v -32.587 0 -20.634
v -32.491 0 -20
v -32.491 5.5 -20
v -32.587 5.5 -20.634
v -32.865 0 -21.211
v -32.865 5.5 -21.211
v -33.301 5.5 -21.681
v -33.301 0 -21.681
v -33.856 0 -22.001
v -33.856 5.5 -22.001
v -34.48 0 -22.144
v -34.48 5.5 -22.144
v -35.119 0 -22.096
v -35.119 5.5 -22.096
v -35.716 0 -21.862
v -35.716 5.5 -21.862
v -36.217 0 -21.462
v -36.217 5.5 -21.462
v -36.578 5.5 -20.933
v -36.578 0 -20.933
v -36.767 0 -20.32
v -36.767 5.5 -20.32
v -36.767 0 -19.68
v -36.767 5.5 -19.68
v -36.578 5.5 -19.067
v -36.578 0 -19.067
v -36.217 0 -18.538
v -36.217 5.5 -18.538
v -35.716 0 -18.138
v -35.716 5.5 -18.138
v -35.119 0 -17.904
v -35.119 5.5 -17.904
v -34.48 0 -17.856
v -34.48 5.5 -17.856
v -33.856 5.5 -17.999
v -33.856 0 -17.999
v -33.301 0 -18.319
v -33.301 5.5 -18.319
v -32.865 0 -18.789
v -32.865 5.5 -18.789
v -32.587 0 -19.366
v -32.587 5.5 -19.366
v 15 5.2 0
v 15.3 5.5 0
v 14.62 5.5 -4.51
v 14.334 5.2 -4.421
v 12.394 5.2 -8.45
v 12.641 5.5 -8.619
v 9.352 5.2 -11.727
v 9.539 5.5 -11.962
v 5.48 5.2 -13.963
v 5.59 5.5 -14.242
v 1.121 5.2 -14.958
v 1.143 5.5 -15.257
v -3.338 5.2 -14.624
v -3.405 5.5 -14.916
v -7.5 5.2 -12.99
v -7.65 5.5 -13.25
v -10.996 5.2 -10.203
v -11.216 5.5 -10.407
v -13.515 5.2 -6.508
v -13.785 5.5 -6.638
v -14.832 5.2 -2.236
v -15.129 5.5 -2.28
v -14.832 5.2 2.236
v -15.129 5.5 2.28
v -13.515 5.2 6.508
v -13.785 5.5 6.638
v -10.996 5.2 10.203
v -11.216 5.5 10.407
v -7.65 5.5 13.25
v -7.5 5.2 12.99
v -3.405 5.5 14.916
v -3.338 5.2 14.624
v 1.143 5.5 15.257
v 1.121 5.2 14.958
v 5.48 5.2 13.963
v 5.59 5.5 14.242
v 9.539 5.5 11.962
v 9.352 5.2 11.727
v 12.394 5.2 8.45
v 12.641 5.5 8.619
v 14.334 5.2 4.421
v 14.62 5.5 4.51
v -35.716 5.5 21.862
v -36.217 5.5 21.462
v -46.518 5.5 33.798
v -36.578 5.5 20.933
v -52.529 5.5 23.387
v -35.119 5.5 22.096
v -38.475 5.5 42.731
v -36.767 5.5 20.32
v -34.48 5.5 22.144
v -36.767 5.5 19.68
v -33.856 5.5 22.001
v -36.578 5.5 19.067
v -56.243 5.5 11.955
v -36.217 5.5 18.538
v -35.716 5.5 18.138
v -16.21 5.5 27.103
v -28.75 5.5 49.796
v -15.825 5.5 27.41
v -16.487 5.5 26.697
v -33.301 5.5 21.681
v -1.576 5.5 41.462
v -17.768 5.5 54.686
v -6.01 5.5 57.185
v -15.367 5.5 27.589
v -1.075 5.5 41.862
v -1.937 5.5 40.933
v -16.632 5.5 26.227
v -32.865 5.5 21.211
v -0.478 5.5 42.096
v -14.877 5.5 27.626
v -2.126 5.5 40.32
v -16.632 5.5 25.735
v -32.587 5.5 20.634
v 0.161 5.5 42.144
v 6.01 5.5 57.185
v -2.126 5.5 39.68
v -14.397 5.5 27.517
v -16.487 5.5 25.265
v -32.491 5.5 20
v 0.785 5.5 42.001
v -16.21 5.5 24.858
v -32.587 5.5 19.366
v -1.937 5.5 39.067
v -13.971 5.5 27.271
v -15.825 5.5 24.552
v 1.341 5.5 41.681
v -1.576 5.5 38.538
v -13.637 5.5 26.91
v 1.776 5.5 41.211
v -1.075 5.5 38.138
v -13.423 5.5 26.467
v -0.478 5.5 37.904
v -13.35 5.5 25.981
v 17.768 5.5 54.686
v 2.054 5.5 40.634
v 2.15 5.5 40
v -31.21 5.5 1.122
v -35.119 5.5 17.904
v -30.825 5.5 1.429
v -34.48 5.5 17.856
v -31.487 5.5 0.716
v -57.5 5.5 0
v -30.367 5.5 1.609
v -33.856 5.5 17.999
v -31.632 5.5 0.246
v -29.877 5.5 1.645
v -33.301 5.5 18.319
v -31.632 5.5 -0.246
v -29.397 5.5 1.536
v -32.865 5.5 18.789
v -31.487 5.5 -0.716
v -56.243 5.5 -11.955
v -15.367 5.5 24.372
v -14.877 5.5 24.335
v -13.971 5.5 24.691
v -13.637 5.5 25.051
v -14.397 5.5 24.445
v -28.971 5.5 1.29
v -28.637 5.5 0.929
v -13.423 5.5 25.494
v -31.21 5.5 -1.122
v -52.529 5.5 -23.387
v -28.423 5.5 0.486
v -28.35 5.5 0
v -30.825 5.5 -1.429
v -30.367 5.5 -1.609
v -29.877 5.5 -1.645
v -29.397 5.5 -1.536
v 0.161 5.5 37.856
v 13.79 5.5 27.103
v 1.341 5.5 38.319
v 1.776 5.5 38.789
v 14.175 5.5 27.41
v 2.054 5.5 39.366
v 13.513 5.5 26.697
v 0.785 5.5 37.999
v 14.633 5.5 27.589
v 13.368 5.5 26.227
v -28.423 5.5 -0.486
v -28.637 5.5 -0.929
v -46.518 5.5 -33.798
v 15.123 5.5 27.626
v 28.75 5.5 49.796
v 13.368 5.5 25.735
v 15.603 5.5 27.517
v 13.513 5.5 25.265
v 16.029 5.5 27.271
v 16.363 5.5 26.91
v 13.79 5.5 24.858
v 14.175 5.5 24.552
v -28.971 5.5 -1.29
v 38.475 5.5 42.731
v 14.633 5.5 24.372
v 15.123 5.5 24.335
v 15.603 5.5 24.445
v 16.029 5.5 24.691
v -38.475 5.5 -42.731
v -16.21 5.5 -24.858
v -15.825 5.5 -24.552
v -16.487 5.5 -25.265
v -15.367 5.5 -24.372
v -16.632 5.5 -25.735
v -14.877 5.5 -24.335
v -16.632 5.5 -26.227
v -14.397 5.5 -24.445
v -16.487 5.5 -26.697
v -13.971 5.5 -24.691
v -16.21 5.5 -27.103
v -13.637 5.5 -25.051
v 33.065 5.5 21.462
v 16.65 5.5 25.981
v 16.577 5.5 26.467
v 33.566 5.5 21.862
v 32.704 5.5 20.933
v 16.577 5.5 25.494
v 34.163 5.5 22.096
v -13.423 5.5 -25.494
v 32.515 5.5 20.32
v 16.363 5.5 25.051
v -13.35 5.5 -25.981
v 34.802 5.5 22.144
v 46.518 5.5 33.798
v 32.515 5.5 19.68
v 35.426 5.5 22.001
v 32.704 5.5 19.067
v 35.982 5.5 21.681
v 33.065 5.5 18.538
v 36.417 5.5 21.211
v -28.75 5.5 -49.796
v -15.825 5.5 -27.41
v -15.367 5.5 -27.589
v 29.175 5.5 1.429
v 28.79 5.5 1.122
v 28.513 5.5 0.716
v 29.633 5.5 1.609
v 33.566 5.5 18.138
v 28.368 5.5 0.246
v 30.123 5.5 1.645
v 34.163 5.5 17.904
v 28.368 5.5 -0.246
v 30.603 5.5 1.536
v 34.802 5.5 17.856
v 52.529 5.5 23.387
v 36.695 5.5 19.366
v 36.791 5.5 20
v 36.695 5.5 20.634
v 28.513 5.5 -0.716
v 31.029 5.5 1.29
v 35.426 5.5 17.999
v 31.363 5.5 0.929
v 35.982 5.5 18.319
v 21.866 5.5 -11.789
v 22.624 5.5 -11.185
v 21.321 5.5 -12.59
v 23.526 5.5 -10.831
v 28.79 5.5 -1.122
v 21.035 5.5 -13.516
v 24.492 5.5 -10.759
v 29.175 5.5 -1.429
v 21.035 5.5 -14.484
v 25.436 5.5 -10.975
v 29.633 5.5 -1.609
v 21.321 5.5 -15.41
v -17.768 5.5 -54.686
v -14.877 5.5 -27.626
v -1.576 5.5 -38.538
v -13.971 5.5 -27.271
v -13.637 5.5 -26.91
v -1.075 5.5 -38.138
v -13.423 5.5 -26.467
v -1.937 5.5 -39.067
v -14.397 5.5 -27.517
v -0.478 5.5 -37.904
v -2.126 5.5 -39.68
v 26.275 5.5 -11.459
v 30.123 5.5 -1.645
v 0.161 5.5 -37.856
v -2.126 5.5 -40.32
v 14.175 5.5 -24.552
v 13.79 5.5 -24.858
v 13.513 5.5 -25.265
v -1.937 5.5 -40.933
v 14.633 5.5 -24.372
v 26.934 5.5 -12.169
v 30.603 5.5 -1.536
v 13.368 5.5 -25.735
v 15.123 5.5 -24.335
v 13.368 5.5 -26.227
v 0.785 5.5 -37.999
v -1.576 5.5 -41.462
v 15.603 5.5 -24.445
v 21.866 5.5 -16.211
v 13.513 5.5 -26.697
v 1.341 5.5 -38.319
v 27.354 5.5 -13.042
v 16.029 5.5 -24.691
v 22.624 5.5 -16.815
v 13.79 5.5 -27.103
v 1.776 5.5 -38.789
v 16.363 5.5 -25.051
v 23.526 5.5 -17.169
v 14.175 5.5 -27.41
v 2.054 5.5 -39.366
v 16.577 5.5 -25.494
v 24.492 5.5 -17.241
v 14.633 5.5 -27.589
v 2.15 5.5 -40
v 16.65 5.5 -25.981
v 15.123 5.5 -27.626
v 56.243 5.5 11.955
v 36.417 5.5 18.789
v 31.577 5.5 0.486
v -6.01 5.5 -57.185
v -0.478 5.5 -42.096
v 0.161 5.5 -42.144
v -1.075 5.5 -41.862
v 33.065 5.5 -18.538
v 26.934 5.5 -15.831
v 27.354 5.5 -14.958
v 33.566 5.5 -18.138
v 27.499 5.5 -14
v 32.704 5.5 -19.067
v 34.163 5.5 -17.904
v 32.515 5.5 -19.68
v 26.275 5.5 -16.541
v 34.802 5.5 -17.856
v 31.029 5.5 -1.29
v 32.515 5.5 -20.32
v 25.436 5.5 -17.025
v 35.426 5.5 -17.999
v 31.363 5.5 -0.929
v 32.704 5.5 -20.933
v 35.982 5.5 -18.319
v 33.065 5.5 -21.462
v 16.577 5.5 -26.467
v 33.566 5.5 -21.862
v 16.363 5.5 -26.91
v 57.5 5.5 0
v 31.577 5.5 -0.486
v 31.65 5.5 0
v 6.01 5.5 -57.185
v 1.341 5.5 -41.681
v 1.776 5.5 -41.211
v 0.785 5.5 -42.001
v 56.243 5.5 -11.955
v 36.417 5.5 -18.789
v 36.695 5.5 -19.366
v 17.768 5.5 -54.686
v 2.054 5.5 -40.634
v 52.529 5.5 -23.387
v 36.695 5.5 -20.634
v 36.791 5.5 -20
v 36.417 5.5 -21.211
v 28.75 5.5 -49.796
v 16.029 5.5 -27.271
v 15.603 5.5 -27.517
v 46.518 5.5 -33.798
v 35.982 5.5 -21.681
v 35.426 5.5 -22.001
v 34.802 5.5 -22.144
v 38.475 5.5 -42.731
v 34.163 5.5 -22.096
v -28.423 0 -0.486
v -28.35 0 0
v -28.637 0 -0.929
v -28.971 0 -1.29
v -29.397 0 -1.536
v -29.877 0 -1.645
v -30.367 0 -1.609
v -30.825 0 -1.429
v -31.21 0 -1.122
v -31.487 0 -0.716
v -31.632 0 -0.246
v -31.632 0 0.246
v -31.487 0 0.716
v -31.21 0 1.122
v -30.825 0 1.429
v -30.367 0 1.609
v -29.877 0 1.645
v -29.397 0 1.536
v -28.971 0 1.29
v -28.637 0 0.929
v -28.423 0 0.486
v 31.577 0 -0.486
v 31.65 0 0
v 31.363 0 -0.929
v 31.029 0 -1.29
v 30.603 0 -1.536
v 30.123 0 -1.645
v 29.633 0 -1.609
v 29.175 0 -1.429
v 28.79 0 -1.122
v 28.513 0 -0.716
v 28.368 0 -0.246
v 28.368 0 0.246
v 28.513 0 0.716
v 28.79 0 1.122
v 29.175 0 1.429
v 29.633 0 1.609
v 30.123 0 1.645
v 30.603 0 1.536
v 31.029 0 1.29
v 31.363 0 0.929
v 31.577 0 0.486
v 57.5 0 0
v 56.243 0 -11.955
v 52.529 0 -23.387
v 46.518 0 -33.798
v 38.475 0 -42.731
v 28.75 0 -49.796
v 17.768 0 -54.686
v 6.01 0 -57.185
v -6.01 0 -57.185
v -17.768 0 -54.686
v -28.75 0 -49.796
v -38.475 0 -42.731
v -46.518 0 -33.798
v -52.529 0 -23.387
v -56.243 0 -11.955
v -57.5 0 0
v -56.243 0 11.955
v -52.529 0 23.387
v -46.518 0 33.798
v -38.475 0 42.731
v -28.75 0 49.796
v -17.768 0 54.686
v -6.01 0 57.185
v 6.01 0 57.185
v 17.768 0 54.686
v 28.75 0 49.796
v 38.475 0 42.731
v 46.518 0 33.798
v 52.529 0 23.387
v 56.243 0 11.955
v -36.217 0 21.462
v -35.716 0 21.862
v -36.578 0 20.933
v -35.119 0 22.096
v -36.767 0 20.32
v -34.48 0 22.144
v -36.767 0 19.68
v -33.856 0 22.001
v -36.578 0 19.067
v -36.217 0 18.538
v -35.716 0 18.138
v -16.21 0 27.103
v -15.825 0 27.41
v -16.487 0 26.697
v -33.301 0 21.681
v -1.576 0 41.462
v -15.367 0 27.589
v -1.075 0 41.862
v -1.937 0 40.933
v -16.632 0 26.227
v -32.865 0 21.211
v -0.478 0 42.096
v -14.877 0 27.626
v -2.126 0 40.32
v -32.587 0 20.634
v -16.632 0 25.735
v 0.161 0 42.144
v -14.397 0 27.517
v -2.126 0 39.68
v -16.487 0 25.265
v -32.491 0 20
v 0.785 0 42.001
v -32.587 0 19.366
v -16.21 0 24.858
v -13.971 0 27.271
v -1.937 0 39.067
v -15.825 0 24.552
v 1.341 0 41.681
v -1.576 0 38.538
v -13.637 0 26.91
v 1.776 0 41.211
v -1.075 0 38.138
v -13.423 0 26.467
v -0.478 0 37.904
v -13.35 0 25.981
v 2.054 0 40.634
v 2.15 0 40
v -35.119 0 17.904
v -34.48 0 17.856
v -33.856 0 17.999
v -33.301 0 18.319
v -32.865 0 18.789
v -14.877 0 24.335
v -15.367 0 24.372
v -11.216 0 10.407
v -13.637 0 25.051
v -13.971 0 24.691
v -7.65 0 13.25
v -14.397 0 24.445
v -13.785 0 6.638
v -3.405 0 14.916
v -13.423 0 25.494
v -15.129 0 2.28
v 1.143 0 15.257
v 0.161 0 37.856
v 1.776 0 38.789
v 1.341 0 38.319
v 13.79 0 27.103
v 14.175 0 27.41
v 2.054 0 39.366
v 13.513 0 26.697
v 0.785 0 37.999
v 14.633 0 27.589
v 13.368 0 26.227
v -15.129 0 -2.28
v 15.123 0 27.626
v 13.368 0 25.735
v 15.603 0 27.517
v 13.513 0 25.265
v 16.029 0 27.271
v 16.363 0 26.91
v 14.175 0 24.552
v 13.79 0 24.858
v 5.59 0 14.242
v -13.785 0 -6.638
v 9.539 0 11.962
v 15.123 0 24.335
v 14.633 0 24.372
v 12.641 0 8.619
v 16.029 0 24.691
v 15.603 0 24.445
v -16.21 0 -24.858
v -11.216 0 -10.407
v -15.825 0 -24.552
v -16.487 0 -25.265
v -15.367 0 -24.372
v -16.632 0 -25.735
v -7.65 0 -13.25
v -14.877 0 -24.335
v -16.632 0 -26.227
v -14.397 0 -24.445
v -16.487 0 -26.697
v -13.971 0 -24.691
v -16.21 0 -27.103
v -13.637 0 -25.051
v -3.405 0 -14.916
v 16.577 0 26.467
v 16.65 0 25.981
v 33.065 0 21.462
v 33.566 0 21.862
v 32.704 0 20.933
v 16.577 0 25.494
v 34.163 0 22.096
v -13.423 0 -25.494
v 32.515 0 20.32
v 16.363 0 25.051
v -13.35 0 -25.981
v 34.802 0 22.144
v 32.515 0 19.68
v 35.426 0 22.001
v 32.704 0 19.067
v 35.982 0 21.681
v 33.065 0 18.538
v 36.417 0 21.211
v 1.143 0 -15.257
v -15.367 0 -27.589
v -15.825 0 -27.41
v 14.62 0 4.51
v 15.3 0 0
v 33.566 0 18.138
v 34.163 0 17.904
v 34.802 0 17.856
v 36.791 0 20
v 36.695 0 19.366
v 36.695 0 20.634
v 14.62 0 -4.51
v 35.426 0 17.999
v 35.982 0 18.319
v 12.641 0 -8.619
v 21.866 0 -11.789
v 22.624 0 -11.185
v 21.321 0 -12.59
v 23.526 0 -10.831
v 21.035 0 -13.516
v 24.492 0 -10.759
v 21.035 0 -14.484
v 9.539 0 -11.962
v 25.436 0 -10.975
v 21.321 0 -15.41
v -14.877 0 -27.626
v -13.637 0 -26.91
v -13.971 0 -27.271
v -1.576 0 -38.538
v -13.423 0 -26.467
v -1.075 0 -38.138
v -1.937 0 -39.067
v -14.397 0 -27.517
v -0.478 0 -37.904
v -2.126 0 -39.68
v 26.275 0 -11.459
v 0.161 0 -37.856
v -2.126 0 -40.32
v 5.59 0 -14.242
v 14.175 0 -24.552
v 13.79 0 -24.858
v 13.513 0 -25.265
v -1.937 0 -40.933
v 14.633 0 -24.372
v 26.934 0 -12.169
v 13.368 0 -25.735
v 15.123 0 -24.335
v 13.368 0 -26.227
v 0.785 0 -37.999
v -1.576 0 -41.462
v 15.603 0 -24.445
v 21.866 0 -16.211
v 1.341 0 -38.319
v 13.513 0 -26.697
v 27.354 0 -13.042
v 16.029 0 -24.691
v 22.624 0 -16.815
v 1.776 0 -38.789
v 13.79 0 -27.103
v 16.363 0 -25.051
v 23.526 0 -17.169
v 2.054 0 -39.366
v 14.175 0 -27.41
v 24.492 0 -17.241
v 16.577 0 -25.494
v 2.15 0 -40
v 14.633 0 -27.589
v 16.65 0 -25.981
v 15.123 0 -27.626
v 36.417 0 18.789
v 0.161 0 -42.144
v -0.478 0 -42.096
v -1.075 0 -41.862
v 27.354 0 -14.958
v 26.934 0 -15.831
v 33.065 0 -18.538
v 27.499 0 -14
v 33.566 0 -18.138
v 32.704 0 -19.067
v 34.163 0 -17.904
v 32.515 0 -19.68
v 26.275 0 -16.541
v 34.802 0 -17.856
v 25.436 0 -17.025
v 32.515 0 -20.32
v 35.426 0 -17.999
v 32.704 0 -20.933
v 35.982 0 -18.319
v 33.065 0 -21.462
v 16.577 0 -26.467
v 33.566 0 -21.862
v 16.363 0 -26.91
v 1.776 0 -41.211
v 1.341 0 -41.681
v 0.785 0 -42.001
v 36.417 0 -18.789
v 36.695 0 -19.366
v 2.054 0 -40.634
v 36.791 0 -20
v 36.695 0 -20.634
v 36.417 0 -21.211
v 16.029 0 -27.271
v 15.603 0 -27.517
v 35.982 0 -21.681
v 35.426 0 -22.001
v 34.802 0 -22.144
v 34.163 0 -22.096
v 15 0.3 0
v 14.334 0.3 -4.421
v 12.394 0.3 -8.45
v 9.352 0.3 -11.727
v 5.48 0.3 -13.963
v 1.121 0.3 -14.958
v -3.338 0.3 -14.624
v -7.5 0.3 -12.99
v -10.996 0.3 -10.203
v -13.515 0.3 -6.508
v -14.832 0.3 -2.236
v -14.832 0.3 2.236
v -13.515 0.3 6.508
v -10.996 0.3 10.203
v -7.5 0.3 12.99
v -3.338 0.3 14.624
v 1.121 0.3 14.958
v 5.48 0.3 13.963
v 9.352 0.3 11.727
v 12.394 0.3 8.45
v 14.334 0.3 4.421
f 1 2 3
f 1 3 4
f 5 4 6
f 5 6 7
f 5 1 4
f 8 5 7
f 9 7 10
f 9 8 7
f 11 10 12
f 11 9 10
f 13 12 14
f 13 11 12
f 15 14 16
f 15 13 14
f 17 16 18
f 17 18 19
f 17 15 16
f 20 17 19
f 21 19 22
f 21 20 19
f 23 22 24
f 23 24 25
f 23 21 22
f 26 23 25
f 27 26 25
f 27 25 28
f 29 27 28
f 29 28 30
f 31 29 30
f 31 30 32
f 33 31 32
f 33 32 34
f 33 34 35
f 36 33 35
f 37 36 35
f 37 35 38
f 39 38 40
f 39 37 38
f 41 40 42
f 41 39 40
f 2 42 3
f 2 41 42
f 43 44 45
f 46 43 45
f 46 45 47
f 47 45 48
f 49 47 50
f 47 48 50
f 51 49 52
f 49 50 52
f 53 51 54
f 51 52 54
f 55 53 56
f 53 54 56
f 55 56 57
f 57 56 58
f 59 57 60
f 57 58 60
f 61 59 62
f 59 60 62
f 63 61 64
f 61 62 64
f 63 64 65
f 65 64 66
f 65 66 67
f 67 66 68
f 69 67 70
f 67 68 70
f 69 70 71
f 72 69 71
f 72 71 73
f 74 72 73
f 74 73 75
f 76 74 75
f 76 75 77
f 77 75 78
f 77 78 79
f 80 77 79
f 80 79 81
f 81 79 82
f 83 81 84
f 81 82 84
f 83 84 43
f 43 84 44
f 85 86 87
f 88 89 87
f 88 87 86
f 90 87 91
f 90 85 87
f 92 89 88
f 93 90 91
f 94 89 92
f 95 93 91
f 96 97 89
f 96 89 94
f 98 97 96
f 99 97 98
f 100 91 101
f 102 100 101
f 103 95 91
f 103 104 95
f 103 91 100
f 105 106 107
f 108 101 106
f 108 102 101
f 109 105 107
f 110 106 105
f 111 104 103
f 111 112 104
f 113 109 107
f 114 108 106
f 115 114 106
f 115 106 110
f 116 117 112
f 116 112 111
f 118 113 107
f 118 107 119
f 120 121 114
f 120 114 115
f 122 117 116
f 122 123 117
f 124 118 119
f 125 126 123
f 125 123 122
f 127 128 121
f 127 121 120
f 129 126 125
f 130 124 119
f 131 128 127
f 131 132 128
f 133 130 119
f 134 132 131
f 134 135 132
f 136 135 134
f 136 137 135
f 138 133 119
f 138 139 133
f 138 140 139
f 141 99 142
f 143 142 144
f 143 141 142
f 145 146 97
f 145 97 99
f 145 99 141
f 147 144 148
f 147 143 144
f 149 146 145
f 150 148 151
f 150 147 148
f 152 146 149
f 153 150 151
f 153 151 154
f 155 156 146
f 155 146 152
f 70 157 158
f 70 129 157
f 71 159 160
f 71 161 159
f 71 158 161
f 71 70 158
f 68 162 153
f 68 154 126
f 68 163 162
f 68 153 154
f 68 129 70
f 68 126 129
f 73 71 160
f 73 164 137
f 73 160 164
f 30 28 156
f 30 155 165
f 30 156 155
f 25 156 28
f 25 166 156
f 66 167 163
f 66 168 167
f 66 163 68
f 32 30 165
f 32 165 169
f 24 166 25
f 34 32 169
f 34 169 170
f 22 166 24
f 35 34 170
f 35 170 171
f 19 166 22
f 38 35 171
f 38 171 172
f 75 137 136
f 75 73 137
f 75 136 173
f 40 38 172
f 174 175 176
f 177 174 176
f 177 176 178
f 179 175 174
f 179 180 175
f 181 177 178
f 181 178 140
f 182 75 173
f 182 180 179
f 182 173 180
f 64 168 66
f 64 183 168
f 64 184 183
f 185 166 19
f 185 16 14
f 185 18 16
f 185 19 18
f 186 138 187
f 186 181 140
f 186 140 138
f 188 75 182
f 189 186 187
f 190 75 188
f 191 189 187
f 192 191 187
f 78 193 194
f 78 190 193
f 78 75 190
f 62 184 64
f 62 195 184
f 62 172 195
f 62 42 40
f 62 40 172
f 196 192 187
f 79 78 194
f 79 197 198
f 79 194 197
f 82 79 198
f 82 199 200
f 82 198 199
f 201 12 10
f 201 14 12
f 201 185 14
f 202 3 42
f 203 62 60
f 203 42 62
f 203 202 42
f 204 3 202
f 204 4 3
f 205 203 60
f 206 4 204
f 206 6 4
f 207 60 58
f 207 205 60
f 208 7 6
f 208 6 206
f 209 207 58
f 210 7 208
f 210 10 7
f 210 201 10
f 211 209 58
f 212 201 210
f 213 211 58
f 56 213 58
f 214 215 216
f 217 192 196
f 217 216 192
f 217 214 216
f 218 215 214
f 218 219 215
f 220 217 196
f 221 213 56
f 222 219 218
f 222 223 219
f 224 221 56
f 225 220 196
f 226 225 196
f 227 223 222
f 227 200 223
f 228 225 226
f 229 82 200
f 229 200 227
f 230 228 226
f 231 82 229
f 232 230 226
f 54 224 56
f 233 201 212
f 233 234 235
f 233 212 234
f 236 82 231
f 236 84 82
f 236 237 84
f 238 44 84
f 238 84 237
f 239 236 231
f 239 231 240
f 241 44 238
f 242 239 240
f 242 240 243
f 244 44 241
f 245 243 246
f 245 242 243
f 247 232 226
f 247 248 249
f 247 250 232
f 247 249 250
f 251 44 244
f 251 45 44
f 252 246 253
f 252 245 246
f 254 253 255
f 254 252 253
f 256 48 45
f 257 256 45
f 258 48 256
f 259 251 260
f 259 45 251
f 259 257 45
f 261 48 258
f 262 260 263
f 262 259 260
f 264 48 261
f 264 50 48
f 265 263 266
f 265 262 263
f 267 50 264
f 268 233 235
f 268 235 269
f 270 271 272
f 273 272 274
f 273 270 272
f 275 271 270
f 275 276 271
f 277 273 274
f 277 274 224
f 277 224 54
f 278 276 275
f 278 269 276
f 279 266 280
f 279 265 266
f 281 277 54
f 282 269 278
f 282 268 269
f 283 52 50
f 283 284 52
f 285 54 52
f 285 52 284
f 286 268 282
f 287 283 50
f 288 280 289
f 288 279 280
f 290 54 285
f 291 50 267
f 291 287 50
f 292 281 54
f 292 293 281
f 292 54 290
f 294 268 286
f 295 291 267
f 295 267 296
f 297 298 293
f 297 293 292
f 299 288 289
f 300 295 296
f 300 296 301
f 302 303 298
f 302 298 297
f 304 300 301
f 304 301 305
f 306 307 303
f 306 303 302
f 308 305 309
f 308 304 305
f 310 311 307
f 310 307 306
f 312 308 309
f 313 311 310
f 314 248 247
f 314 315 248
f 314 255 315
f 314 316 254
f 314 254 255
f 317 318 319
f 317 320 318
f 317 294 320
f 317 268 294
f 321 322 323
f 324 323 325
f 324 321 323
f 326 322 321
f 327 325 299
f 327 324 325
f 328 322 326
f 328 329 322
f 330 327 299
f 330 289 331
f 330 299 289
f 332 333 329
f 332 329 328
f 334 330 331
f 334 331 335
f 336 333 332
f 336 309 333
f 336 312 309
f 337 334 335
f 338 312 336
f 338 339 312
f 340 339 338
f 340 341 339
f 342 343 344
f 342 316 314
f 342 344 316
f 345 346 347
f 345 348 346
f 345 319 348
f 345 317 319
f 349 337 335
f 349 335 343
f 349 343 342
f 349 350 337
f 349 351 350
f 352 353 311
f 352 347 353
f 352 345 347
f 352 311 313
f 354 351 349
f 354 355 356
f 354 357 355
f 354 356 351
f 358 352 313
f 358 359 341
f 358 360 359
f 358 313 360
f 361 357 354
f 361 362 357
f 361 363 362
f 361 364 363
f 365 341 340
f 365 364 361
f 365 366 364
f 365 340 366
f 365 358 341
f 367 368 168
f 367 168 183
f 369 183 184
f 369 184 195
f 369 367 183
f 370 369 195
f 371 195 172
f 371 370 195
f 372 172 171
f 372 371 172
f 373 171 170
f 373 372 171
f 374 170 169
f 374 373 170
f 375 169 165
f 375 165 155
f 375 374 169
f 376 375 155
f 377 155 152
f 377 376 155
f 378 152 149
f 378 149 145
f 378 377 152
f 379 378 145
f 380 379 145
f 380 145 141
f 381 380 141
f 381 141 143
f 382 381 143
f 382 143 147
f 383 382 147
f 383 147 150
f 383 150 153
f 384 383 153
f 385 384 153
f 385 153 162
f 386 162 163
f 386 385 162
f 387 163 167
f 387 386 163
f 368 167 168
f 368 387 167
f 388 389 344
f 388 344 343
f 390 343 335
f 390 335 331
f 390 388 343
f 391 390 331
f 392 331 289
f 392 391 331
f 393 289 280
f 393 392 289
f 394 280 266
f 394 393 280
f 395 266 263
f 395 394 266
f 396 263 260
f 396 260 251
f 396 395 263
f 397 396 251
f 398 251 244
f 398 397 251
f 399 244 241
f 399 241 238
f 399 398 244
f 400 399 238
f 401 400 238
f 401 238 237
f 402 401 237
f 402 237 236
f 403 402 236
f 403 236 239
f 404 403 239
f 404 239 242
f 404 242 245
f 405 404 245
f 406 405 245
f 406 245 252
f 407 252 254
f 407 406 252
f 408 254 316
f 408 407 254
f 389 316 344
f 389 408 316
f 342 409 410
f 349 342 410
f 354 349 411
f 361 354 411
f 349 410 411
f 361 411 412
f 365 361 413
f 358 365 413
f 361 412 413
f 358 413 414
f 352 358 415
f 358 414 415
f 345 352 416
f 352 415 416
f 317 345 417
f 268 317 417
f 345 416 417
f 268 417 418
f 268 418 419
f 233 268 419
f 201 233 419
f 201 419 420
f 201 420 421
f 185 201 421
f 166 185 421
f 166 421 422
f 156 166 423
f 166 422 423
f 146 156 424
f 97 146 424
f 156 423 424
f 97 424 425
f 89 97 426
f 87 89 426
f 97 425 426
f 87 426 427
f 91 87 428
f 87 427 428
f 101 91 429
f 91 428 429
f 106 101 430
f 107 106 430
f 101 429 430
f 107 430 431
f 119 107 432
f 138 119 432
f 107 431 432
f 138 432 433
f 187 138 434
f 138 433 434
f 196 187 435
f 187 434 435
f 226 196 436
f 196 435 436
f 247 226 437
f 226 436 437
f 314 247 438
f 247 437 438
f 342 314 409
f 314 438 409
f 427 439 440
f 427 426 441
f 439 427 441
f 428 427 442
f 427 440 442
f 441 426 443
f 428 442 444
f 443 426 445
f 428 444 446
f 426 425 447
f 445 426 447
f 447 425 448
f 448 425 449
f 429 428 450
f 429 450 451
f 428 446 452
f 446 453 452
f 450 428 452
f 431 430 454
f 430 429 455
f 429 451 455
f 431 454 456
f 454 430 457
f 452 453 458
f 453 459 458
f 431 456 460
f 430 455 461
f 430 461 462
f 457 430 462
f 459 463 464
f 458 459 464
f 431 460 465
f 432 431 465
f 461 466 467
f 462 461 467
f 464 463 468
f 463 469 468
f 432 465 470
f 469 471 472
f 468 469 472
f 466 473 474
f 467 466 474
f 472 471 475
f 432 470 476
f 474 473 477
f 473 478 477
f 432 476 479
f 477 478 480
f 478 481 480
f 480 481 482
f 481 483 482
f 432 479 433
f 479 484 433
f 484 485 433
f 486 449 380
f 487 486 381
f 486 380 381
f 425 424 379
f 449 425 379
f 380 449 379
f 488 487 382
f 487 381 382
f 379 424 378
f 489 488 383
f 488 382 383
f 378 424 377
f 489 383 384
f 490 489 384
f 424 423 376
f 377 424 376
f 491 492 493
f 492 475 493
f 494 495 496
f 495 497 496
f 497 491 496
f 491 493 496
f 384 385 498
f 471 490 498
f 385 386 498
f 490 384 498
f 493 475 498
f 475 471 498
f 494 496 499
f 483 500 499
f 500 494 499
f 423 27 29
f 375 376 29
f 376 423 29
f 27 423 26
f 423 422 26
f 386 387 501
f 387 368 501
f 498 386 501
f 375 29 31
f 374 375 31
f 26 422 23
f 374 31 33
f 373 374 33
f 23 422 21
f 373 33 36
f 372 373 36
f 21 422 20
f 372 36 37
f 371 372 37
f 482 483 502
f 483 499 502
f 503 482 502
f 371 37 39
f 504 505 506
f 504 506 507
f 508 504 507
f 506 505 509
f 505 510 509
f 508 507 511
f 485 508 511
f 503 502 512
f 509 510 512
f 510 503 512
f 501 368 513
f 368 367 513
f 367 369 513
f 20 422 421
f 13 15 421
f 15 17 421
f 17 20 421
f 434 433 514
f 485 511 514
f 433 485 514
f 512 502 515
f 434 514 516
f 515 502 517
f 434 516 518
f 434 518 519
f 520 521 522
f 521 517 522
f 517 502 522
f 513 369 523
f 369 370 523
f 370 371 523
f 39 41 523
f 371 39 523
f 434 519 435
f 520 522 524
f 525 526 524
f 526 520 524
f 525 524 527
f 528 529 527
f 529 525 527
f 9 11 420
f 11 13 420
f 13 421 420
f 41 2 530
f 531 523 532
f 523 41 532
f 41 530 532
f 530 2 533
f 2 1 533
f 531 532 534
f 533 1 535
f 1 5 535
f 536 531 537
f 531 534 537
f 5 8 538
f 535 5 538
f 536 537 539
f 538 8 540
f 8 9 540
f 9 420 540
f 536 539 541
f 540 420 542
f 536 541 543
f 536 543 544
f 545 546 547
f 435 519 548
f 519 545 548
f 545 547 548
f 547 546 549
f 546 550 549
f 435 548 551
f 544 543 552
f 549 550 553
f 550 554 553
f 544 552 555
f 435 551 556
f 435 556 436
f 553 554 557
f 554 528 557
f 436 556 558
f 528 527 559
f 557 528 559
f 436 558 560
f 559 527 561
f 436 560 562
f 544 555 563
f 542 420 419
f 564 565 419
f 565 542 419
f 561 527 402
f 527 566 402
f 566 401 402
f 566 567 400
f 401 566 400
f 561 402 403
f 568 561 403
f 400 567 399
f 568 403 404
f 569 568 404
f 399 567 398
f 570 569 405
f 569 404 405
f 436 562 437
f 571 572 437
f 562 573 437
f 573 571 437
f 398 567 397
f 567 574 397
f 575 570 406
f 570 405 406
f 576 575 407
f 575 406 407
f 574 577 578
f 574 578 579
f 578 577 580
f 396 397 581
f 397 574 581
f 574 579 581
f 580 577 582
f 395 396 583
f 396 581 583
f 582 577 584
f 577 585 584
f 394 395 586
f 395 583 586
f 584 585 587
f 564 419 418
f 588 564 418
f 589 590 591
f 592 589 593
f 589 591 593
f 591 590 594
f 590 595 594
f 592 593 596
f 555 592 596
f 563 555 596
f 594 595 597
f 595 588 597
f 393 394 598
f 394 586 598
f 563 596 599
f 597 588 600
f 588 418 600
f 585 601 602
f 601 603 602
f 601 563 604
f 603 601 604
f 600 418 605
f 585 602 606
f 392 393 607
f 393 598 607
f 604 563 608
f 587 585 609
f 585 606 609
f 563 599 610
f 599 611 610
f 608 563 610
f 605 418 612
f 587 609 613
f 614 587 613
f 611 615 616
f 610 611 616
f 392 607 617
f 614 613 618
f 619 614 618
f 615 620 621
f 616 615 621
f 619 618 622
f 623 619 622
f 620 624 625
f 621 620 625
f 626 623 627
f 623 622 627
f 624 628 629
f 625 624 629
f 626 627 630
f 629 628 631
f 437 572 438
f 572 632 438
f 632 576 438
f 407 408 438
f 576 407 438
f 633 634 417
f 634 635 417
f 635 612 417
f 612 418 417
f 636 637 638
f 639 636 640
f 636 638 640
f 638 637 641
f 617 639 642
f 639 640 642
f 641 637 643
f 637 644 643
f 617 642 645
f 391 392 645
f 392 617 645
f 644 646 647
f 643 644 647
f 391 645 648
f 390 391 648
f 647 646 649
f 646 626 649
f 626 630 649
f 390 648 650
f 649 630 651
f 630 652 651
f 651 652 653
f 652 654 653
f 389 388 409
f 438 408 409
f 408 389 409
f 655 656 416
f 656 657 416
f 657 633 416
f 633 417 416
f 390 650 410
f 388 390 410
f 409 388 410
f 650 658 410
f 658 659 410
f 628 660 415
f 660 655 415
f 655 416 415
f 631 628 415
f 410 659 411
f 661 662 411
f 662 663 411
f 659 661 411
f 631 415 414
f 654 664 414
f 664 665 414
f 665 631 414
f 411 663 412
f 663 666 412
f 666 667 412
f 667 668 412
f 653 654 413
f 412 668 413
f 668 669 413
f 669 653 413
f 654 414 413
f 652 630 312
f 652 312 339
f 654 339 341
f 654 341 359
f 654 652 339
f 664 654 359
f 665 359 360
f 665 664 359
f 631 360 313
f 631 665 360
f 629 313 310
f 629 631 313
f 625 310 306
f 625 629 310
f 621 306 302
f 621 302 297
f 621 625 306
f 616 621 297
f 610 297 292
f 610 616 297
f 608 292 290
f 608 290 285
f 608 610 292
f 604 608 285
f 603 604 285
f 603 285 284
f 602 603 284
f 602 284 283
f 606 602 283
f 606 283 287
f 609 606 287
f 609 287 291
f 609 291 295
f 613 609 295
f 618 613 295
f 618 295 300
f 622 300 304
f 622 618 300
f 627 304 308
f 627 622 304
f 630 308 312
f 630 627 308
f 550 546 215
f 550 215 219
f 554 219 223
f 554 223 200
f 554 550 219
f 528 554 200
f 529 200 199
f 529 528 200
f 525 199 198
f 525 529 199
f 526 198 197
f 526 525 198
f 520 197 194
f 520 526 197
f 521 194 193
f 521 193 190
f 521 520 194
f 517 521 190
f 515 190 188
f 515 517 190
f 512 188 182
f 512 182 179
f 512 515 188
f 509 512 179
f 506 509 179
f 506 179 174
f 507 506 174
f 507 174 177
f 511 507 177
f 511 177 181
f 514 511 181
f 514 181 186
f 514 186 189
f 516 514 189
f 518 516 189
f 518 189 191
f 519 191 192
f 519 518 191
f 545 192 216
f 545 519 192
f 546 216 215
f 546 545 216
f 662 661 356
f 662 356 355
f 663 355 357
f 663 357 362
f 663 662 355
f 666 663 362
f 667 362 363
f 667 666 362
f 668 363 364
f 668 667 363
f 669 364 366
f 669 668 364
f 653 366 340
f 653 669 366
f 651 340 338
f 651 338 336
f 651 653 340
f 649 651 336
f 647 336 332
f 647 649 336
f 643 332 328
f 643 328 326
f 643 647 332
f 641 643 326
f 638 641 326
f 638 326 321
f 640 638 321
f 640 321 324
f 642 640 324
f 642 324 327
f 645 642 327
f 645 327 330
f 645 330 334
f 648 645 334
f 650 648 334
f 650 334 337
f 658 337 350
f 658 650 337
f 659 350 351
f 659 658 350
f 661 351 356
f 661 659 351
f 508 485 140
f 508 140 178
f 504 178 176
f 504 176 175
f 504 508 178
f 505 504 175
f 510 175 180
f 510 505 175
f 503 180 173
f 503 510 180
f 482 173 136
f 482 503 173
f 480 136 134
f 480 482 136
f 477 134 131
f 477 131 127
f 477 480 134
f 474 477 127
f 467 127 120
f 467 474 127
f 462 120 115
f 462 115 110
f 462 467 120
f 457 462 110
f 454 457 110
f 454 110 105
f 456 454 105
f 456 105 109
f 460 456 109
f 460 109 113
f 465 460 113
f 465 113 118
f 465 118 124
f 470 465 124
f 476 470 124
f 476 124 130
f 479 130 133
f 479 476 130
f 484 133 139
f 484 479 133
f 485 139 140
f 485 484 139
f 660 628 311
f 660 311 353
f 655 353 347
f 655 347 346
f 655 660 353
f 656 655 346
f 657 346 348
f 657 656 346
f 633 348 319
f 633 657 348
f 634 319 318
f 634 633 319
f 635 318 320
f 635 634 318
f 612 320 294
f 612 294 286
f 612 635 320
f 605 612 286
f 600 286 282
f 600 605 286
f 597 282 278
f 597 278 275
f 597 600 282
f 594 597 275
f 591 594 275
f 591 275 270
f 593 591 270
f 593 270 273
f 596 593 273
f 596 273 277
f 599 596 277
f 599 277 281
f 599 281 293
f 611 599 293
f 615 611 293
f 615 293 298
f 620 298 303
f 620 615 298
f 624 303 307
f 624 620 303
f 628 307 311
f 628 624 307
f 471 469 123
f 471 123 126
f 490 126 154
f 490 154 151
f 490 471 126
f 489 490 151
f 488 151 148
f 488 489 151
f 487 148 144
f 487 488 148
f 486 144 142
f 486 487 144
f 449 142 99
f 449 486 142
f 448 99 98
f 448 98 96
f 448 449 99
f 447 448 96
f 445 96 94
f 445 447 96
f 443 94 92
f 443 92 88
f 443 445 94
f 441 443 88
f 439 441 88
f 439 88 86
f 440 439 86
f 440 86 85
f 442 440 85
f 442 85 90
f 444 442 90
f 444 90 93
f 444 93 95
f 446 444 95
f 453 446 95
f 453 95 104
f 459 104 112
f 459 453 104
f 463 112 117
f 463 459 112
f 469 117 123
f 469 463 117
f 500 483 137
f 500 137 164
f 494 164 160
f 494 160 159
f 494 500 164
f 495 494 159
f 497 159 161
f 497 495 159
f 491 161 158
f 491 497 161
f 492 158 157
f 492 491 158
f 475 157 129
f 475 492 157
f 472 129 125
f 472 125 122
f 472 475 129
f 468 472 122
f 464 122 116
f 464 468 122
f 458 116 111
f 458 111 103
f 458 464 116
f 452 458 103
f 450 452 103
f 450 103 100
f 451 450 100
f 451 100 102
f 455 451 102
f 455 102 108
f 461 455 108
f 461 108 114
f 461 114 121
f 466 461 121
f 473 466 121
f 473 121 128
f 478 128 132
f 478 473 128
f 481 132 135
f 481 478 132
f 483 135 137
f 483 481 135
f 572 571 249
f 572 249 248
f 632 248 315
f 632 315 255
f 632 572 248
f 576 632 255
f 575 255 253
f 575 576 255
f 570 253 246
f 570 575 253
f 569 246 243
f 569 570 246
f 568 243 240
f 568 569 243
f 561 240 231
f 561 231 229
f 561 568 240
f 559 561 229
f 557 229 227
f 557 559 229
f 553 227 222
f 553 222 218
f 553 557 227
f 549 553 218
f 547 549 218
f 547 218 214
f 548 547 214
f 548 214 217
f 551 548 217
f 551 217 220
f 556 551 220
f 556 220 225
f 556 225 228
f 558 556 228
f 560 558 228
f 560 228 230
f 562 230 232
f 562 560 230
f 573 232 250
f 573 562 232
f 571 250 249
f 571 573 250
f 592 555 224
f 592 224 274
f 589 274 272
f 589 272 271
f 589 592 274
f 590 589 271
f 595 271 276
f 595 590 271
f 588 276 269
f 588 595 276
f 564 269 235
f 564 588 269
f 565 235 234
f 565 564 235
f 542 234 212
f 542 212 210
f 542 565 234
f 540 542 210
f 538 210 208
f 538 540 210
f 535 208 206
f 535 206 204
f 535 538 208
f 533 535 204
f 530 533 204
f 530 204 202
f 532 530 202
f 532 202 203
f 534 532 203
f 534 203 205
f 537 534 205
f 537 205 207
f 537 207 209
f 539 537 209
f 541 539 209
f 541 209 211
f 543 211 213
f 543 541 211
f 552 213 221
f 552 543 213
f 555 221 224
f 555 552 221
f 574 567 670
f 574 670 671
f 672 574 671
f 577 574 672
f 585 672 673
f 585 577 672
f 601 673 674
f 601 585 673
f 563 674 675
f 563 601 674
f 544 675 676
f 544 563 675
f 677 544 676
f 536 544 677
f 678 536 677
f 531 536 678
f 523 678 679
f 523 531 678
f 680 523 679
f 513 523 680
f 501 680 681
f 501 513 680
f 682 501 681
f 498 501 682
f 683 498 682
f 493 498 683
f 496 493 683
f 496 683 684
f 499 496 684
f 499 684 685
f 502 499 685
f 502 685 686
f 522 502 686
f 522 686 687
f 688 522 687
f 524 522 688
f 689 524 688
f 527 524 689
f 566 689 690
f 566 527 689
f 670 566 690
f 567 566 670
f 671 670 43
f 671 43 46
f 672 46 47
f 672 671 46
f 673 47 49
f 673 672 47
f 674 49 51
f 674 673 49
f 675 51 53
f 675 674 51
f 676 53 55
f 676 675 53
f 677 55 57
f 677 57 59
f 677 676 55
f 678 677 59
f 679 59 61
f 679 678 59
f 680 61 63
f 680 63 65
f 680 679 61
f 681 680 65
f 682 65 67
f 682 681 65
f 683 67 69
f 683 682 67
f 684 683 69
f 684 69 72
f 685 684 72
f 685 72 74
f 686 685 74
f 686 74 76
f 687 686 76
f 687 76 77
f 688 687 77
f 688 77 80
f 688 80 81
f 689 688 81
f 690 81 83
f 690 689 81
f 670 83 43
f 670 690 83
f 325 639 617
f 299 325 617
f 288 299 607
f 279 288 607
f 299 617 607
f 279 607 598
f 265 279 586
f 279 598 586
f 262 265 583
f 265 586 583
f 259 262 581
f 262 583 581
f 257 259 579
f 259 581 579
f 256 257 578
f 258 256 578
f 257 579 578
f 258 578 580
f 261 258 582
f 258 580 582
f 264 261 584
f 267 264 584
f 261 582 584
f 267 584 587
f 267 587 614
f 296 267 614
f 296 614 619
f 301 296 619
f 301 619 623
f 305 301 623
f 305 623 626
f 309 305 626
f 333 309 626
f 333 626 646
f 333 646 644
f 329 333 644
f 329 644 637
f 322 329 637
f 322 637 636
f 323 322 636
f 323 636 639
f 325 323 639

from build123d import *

# Parameters (mm, degrees)
SKETCH1_R           = 57.5
SKETCH1_R_2         = 1.65
SKETCH1_R_3         = 2.15
SKETCH1_R_4         = 15
BOSS_EXTRUDE1_DEPTH = 5.5
CHAMFER2_SIZE       = 0.3
SKETCH3_R           = 3.25
CUT_EXTRUDE2_DEPTH  = 10


with BuildPart() as part:
    # Sketch1 → Boss-Extrude1 (new body)
    with BuildSketch(Plane(origin=(0, 0, 0), x_dir=(1, 0, 0), z_dir=(0, 1, 0))):
        Circle(SKETCH1_R)
        with Locations((-30, 0)):
            Circle(SKETCH1_R_2, mode=Mode.SUBTRACT)
        with Locations((-15, 25.980762114)):
            Circle(SKETCH1_R_2, mode=Mode.SUBTRACT)
        with Locations((15, 25.980762114)):
            Circle(SKETCH1_R_2, mode=Mode.SUBTRACT)
        with Locations((30, 0)):
            Circle(SKETCH1_R_2, mode=Mode.SUBTRACT)
        with Locations((15, -25.980762114)):
            Circle(SKETCH1_R_2, mode=Mode.SUBTRACT)
        with Locations((-15, -25.980762114)):
            Circle(SKETCH1_R_2, mode=Mode.SUBTRACT)
        with Locations((-34.641016151, 20)):
            Circle(SKETCH1_R_3, mode=Mode.SUBTRACT)
        with Locations((0, 40)):
            Circle(SKETCH1_R_3, mode=Mode.SUBTRACT)
        with Locations((34.641016151, 20)):
            Circle(SKETCH1_R_3, mode=Mode.SUBTRACT)
        with Locations((34.641016151, -20)):
            Circle(SKETCH1_R_3, mode=Mode.SUBTRACT)
        with Locations((0, -40)):
            Circle(SKETCH1_R_3, mode=Mode.SUBTRACT)
        with Locations((-34.641016151, -20)):
            Circle(SKETCH1_R_3, mode=Mode.SUBTRACT)
        Circle(SKETCH1_R_4, mode=Mode.SUBTRACT)
    extrude(amount=BOSS_EXTRUDE1_DEPTH)

    # Chamfer2
    chamfer2_edges = [part.edges().sort_by_distance(p)[0] for p in [
        (-15, 0, 0),
        (-15, 5.5, 0),
    ]]
    chamfer(chamfer2_edges, length=CHAMFER2_SIZE)

    # Sketch3 → Cut-Extrude2 (cut)
    with BuildSketch(Plane.XZ):
        with Locations((24.248711306, -14)):
            Circle(SKETCH3_R)
    extrude(amount=-CUT_EXTRUDE2_DEPTH, mode=Mode.SUBTRACT)


solid = part.part
